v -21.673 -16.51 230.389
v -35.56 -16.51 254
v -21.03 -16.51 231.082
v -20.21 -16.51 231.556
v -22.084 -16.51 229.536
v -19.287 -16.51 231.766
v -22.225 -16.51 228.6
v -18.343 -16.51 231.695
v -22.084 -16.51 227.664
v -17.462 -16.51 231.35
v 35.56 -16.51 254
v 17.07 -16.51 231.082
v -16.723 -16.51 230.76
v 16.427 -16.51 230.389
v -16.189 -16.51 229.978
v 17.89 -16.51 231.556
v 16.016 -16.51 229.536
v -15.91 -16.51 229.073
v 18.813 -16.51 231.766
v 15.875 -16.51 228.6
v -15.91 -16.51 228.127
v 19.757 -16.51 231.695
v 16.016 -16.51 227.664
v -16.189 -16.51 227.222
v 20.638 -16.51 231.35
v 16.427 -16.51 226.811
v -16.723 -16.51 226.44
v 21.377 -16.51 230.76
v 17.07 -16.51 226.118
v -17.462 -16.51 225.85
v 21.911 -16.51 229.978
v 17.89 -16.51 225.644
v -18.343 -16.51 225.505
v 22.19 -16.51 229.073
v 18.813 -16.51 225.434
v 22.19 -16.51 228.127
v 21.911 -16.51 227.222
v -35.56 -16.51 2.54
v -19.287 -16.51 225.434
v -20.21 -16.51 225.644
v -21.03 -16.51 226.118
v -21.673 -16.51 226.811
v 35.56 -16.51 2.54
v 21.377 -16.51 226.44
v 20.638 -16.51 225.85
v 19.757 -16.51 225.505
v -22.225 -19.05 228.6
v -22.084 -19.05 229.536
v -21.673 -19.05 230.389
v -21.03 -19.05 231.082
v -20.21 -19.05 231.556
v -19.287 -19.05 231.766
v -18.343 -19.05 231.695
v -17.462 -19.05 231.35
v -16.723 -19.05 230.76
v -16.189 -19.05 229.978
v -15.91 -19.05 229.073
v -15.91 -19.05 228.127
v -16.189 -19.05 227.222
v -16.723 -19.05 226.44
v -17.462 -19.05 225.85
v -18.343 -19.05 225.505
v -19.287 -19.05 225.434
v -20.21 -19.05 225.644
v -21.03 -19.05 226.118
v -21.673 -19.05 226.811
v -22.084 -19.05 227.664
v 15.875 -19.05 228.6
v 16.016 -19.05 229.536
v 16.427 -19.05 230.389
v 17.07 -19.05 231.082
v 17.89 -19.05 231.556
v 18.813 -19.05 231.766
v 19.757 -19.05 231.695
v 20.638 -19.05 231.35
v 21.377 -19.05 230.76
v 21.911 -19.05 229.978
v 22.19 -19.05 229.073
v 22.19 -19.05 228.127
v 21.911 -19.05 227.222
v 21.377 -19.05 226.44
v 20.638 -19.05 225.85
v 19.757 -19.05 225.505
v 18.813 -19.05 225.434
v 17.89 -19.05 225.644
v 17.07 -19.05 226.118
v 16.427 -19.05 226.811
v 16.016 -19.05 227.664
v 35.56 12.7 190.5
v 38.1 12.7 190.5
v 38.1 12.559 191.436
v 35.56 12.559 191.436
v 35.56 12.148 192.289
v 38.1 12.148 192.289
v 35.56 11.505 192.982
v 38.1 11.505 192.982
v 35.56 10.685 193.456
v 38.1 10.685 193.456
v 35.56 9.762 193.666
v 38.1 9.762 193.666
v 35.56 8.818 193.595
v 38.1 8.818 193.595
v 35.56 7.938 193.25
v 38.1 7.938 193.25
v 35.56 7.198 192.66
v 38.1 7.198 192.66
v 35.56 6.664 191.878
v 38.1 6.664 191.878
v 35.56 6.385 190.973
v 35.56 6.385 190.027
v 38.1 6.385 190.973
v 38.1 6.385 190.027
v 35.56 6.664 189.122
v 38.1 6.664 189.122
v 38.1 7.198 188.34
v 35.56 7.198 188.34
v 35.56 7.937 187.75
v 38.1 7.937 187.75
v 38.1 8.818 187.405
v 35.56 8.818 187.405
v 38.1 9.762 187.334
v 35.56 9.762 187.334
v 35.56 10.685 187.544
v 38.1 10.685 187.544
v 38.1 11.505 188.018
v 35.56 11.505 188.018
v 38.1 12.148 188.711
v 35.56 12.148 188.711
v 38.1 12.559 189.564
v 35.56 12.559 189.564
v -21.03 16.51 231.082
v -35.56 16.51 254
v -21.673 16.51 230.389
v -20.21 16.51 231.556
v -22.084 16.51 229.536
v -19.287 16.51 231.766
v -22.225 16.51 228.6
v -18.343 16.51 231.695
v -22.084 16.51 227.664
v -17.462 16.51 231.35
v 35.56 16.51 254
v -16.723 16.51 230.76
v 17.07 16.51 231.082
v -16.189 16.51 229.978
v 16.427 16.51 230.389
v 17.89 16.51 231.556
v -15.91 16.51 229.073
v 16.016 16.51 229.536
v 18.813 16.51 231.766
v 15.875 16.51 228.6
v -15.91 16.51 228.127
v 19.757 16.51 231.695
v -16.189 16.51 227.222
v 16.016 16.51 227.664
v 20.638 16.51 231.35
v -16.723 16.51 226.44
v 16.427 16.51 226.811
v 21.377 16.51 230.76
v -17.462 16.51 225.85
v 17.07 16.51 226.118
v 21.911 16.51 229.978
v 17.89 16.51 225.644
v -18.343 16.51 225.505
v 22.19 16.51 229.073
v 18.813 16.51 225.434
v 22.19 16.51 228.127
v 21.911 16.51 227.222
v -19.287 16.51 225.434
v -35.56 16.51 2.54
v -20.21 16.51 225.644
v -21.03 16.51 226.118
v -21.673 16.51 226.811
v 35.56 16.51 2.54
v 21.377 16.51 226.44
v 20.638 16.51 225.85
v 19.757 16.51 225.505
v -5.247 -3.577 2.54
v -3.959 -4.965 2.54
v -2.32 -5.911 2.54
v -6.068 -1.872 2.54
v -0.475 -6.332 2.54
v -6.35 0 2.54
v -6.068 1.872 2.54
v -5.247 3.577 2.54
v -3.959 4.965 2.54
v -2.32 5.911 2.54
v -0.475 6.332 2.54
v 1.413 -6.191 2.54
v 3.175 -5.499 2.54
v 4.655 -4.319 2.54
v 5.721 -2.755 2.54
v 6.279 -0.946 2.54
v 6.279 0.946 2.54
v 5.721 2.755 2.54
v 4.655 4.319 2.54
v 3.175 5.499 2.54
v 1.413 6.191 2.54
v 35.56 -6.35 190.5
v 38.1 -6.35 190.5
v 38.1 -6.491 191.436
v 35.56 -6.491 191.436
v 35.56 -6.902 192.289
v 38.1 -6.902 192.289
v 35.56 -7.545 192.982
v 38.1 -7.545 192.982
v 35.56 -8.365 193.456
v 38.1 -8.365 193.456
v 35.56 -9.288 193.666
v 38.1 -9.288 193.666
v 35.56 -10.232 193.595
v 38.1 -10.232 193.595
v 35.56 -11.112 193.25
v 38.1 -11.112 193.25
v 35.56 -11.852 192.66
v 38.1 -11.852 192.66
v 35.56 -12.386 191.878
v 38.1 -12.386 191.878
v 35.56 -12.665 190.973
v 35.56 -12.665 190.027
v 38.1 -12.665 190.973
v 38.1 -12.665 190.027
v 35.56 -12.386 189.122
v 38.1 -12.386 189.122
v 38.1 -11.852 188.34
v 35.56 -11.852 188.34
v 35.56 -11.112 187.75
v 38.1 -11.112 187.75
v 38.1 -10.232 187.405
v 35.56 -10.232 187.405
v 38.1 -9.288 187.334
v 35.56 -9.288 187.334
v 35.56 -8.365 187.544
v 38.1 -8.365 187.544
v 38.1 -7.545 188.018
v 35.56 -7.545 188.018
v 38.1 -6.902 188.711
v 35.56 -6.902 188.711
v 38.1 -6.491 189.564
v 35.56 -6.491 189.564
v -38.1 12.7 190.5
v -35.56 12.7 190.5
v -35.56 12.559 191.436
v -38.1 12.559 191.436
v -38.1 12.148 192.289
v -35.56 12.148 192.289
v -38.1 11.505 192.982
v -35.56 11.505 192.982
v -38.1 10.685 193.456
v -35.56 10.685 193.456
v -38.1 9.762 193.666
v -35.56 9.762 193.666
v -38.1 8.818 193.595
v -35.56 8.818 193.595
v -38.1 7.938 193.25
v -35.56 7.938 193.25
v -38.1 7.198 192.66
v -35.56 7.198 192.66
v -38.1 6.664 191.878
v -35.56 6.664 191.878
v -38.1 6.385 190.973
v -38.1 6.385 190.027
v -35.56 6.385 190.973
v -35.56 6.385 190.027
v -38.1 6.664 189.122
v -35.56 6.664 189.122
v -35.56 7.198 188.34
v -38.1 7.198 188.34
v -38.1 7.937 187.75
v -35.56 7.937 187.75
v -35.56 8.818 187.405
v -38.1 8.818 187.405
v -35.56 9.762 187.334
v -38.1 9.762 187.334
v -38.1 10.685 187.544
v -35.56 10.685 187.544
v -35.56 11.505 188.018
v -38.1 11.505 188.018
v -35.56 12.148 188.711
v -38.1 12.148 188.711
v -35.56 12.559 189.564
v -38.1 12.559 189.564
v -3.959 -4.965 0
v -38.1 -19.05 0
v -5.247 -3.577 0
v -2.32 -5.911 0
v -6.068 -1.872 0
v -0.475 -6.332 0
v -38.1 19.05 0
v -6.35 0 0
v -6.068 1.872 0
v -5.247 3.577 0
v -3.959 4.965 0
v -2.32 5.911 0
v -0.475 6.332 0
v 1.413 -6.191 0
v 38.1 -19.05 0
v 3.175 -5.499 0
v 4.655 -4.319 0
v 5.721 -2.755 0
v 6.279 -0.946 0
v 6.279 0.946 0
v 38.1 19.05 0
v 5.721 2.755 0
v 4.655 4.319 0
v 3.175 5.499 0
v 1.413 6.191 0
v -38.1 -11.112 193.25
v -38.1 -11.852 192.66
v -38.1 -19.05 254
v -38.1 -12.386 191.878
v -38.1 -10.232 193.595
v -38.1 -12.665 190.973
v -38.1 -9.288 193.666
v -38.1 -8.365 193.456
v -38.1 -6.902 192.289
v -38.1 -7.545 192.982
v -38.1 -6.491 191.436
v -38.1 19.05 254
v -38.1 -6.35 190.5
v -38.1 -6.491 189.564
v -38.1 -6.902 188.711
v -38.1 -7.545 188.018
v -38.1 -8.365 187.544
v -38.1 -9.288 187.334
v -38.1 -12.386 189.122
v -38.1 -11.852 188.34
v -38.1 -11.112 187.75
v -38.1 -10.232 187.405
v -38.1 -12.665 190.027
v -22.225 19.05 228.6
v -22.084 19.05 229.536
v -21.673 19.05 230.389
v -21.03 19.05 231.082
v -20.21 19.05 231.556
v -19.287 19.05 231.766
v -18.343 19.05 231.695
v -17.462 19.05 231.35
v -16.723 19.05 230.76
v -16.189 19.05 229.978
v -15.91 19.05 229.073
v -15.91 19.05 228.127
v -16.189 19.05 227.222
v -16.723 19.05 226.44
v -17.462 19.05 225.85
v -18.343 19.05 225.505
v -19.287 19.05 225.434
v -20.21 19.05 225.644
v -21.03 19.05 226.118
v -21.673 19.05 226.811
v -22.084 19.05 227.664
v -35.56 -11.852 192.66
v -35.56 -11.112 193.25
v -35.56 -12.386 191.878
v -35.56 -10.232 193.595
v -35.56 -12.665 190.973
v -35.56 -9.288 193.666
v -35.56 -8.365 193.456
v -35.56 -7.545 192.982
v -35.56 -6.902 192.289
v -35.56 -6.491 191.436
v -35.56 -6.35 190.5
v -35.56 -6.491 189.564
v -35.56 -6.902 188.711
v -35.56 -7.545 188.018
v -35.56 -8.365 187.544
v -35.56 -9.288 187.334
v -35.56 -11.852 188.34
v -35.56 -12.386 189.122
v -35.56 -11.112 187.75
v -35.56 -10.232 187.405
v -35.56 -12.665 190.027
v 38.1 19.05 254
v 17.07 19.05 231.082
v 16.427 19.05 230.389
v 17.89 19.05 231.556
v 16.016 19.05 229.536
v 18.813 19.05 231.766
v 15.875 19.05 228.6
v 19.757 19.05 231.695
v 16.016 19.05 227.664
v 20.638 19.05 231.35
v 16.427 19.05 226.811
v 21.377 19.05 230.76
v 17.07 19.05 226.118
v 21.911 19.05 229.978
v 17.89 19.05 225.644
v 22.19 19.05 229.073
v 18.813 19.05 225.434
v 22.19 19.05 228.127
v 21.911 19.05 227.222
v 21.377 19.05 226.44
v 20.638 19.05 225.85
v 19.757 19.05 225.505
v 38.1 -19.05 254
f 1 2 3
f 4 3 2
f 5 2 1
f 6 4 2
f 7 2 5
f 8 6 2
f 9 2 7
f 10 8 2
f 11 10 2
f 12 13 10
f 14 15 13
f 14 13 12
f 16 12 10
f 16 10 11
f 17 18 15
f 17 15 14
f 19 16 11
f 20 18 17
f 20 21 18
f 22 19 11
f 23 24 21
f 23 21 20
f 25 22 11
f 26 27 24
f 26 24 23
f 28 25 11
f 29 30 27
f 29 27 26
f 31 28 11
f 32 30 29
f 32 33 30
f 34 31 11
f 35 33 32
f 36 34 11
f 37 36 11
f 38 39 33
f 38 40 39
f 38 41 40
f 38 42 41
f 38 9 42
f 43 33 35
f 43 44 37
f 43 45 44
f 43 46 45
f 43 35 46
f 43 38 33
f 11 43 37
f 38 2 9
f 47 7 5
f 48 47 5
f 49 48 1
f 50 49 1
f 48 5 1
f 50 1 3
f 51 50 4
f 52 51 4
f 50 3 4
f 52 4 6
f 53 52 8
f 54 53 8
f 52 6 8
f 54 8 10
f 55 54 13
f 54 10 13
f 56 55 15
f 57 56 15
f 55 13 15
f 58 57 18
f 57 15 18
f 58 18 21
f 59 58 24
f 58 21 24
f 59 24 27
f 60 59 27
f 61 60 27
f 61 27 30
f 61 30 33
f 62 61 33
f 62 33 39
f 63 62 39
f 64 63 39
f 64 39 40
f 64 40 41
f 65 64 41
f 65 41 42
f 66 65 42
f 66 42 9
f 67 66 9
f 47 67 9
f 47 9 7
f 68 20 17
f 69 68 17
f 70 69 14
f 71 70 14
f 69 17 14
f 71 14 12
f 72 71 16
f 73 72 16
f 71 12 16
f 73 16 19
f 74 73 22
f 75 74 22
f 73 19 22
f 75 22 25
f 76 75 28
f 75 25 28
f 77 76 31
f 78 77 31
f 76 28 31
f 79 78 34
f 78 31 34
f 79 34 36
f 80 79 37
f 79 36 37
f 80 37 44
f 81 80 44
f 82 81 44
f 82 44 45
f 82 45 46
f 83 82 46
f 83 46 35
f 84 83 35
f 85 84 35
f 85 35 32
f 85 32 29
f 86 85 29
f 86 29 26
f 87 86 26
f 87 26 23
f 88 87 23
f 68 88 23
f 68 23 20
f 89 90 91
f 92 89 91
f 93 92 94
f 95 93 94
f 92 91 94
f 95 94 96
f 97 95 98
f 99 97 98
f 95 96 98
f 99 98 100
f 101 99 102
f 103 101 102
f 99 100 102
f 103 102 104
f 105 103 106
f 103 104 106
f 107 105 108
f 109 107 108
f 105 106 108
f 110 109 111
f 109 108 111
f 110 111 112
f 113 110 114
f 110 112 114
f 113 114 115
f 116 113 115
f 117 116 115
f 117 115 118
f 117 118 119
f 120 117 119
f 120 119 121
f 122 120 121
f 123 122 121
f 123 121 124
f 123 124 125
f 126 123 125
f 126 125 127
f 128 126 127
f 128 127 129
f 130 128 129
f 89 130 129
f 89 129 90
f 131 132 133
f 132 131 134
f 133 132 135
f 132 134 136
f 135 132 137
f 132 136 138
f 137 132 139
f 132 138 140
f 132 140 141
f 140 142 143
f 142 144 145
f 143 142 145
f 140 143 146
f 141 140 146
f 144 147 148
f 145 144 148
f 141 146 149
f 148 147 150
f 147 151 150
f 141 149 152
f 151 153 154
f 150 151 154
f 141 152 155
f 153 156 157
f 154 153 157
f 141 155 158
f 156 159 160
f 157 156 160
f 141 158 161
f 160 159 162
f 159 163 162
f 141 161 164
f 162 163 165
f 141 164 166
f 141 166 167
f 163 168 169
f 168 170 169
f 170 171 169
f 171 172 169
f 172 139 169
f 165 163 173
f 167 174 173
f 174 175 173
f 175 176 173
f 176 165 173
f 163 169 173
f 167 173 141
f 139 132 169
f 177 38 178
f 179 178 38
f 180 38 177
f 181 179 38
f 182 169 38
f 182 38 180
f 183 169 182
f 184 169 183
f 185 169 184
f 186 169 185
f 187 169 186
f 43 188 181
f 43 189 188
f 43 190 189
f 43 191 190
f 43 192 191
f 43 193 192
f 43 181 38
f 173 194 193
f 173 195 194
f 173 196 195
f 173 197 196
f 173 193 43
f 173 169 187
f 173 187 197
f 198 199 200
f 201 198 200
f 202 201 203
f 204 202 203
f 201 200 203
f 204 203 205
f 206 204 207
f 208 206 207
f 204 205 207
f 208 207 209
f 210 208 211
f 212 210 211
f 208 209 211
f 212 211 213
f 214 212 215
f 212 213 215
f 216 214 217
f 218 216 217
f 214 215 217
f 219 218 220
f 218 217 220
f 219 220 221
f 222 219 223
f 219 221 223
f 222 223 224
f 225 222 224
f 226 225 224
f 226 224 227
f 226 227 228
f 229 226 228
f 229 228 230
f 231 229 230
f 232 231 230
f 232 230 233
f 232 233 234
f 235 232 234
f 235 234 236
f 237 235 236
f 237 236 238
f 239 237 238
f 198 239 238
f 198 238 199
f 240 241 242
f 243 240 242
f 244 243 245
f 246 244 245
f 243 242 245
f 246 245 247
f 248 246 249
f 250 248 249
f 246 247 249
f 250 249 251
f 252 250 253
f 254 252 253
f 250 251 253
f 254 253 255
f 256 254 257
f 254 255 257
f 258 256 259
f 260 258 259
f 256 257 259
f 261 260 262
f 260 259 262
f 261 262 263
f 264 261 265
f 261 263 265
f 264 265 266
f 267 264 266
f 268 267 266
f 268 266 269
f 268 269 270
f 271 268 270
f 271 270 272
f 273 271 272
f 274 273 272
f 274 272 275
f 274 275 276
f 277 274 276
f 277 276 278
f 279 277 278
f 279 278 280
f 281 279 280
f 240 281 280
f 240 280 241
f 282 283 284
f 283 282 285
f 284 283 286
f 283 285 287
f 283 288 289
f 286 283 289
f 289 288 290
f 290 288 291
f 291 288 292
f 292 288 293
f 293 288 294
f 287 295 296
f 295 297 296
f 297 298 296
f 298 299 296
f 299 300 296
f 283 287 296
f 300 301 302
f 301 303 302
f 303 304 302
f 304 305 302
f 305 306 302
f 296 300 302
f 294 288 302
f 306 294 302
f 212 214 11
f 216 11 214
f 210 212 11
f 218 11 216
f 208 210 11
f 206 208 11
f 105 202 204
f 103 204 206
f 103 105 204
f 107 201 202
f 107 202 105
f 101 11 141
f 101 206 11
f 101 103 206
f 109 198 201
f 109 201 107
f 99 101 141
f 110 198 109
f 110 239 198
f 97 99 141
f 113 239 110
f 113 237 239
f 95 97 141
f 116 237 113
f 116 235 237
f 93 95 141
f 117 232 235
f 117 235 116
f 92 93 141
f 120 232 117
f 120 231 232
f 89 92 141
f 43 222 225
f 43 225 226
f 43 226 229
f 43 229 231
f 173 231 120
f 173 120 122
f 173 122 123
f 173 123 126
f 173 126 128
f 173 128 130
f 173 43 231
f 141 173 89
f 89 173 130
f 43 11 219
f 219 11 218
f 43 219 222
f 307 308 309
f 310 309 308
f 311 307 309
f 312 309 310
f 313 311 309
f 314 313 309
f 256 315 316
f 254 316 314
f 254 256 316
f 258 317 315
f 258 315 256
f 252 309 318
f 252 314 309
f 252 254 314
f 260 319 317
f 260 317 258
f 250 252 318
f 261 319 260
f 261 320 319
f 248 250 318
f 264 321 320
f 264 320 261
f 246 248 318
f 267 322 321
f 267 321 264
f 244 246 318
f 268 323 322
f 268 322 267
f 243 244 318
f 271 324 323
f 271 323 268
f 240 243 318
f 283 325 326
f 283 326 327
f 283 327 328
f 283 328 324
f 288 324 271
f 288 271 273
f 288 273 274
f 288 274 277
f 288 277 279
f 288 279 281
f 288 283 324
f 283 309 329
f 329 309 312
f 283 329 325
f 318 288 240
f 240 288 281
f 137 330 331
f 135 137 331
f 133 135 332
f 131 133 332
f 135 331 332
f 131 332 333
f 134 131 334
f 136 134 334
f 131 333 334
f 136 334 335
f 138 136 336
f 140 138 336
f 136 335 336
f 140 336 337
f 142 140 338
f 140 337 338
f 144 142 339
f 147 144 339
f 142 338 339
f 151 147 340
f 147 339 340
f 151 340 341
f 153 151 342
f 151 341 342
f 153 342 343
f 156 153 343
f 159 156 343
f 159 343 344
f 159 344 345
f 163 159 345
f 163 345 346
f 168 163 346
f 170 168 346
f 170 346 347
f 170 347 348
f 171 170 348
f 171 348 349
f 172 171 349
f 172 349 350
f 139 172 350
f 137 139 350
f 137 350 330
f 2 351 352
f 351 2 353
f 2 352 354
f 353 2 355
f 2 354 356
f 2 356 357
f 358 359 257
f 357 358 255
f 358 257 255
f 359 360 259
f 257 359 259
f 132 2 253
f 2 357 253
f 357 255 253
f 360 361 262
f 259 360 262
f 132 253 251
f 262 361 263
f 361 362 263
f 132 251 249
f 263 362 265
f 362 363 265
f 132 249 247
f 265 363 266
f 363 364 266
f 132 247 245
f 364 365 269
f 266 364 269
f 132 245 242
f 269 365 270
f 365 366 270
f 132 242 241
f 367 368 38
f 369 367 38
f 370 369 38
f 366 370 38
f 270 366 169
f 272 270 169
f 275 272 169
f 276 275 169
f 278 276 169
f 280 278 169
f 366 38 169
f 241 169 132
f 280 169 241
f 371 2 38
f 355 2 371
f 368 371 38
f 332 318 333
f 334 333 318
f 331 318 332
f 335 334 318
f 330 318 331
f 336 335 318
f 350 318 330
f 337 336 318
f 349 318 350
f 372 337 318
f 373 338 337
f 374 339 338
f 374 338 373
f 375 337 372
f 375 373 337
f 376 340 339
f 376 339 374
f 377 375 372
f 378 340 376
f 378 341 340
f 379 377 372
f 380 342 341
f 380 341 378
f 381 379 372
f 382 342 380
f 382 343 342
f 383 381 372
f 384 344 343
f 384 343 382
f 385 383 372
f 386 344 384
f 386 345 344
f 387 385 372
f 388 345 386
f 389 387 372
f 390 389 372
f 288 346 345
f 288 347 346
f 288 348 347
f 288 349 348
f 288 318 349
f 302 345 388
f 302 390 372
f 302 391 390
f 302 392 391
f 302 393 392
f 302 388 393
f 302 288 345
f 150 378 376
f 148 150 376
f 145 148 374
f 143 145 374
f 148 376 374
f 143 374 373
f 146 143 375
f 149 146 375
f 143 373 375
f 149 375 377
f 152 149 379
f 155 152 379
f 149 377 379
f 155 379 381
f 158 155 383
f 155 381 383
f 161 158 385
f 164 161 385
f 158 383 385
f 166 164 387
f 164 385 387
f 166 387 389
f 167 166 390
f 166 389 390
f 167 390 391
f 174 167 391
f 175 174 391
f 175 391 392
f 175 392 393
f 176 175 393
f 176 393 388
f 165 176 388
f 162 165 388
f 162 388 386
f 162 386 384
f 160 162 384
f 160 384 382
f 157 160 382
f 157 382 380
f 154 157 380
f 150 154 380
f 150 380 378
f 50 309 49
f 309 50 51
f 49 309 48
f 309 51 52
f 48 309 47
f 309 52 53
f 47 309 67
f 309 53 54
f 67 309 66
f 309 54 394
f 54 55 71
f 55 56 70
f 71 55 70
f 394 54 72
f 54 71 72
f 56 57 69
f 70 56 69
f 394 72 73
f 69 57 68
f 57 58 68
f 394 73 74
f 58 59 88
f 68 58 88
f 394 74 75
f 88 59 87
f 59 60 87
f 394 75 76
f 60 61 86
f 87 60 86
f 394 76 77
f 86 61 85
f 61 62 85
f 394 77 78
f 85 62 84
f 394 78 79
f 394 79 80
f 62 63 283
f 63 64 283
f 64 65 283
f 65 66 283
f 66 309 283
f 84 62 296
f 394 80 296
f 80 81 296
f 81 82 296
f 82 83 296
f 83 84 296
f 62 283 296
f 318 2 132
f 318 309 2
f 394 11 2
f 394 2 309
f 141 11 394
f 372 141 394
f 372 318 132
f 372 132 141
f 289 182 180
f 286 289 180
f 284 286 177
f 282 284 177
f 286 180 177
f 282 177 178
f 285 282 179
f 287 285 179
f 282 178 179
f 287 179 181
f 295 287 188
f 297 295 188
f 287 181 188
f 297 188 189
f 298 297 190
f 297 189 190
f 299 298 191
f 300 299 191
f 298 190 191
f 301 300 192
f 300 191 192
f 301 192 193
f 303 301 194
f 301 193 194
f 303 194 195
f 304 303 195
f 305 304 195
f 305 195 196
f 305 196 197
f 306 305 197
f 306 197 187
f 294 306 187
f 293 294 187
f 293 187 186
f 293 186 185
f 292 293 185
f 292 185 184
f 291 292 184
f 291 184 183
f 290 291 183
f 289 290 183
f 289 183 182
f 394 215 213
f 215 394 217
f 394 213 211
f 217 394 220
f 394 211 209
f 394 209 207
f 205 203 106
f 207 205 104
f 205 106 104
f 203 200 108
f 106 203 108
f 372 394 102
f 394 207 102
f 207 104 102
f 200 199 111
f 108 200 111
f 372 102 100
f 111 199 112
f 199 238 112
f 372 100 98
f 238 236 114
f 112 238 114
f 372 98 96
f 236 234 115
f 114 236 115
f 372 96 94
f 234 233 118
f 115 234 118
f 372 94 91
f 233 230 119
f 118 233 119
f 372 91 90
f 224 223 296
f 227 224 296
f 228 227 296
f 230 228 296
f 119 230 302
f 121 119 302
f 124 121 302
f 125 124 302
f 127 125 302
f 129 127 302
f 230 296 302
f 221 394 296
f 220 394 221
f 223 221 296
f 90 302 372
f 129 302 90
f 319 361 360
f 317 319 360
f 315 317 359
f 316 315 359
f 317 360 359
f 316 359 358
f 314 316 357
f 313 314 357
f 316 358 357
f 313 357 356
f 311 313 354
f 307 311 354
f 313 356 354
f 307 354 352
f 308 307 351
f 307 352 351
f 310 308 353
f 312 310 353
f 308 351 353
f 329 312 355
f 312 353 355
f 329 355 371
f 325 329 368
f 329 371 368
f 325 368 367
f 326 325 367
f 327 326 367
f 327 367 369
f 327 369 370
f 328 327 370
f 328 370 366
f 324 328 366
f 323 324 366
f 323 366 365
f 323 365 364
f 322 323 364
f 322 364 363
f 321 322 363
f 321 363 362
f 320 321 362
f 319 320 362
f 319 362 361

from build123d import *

# Parameters (mm, degrees)
F0_W       = 76.2
F0_H       = 38.1
F1_DEPTH   = 254
F2_T       = -2.54
F5_D       = 6.35
F5_ON_F4_D = 6.35
F7_D       = 12.7


with BuildPart() as f1:
    # F0 (on Top) → F1 (new body)
    with BuildSketch(Plane.XY):
        Rectangle(F0_W, F0_H)
    extrude(amount=F1_DEPTH)

    # F2
    f2_openings = [f1.faces().sort_by_distance(p)[0] for p in [
        (0, 0, 254),
    ]]
    offset(amount=F2_T, openings=f2_openings)

    # F5 (through all)
    with Locations(Plane(origin=(-38.1, 0, 0), x_dir=(0, -1, 0), z_dir=(-1, 0, 0))):
        with Locations((-9.525, 190.5), (9.525, 190.5)):
            Hole(F5_D / 2)

    # F5 on F4 (through all)
    with Locations(Plane.XZ.offset(19.05)):
        with Locations((-19.05, 228.6), (19.05, 228.6)):
            Hole(F5_ON_F4_D / 2)

    # F7 (through all)
    with Locations(Plane(origin=(0, 0, 0), x_dir=(1, 0, 0), z_dir=(0, 0, -1))):
        with Locations((0, 0)):
            Hole(F7_D / 2)


solid = f1.part
